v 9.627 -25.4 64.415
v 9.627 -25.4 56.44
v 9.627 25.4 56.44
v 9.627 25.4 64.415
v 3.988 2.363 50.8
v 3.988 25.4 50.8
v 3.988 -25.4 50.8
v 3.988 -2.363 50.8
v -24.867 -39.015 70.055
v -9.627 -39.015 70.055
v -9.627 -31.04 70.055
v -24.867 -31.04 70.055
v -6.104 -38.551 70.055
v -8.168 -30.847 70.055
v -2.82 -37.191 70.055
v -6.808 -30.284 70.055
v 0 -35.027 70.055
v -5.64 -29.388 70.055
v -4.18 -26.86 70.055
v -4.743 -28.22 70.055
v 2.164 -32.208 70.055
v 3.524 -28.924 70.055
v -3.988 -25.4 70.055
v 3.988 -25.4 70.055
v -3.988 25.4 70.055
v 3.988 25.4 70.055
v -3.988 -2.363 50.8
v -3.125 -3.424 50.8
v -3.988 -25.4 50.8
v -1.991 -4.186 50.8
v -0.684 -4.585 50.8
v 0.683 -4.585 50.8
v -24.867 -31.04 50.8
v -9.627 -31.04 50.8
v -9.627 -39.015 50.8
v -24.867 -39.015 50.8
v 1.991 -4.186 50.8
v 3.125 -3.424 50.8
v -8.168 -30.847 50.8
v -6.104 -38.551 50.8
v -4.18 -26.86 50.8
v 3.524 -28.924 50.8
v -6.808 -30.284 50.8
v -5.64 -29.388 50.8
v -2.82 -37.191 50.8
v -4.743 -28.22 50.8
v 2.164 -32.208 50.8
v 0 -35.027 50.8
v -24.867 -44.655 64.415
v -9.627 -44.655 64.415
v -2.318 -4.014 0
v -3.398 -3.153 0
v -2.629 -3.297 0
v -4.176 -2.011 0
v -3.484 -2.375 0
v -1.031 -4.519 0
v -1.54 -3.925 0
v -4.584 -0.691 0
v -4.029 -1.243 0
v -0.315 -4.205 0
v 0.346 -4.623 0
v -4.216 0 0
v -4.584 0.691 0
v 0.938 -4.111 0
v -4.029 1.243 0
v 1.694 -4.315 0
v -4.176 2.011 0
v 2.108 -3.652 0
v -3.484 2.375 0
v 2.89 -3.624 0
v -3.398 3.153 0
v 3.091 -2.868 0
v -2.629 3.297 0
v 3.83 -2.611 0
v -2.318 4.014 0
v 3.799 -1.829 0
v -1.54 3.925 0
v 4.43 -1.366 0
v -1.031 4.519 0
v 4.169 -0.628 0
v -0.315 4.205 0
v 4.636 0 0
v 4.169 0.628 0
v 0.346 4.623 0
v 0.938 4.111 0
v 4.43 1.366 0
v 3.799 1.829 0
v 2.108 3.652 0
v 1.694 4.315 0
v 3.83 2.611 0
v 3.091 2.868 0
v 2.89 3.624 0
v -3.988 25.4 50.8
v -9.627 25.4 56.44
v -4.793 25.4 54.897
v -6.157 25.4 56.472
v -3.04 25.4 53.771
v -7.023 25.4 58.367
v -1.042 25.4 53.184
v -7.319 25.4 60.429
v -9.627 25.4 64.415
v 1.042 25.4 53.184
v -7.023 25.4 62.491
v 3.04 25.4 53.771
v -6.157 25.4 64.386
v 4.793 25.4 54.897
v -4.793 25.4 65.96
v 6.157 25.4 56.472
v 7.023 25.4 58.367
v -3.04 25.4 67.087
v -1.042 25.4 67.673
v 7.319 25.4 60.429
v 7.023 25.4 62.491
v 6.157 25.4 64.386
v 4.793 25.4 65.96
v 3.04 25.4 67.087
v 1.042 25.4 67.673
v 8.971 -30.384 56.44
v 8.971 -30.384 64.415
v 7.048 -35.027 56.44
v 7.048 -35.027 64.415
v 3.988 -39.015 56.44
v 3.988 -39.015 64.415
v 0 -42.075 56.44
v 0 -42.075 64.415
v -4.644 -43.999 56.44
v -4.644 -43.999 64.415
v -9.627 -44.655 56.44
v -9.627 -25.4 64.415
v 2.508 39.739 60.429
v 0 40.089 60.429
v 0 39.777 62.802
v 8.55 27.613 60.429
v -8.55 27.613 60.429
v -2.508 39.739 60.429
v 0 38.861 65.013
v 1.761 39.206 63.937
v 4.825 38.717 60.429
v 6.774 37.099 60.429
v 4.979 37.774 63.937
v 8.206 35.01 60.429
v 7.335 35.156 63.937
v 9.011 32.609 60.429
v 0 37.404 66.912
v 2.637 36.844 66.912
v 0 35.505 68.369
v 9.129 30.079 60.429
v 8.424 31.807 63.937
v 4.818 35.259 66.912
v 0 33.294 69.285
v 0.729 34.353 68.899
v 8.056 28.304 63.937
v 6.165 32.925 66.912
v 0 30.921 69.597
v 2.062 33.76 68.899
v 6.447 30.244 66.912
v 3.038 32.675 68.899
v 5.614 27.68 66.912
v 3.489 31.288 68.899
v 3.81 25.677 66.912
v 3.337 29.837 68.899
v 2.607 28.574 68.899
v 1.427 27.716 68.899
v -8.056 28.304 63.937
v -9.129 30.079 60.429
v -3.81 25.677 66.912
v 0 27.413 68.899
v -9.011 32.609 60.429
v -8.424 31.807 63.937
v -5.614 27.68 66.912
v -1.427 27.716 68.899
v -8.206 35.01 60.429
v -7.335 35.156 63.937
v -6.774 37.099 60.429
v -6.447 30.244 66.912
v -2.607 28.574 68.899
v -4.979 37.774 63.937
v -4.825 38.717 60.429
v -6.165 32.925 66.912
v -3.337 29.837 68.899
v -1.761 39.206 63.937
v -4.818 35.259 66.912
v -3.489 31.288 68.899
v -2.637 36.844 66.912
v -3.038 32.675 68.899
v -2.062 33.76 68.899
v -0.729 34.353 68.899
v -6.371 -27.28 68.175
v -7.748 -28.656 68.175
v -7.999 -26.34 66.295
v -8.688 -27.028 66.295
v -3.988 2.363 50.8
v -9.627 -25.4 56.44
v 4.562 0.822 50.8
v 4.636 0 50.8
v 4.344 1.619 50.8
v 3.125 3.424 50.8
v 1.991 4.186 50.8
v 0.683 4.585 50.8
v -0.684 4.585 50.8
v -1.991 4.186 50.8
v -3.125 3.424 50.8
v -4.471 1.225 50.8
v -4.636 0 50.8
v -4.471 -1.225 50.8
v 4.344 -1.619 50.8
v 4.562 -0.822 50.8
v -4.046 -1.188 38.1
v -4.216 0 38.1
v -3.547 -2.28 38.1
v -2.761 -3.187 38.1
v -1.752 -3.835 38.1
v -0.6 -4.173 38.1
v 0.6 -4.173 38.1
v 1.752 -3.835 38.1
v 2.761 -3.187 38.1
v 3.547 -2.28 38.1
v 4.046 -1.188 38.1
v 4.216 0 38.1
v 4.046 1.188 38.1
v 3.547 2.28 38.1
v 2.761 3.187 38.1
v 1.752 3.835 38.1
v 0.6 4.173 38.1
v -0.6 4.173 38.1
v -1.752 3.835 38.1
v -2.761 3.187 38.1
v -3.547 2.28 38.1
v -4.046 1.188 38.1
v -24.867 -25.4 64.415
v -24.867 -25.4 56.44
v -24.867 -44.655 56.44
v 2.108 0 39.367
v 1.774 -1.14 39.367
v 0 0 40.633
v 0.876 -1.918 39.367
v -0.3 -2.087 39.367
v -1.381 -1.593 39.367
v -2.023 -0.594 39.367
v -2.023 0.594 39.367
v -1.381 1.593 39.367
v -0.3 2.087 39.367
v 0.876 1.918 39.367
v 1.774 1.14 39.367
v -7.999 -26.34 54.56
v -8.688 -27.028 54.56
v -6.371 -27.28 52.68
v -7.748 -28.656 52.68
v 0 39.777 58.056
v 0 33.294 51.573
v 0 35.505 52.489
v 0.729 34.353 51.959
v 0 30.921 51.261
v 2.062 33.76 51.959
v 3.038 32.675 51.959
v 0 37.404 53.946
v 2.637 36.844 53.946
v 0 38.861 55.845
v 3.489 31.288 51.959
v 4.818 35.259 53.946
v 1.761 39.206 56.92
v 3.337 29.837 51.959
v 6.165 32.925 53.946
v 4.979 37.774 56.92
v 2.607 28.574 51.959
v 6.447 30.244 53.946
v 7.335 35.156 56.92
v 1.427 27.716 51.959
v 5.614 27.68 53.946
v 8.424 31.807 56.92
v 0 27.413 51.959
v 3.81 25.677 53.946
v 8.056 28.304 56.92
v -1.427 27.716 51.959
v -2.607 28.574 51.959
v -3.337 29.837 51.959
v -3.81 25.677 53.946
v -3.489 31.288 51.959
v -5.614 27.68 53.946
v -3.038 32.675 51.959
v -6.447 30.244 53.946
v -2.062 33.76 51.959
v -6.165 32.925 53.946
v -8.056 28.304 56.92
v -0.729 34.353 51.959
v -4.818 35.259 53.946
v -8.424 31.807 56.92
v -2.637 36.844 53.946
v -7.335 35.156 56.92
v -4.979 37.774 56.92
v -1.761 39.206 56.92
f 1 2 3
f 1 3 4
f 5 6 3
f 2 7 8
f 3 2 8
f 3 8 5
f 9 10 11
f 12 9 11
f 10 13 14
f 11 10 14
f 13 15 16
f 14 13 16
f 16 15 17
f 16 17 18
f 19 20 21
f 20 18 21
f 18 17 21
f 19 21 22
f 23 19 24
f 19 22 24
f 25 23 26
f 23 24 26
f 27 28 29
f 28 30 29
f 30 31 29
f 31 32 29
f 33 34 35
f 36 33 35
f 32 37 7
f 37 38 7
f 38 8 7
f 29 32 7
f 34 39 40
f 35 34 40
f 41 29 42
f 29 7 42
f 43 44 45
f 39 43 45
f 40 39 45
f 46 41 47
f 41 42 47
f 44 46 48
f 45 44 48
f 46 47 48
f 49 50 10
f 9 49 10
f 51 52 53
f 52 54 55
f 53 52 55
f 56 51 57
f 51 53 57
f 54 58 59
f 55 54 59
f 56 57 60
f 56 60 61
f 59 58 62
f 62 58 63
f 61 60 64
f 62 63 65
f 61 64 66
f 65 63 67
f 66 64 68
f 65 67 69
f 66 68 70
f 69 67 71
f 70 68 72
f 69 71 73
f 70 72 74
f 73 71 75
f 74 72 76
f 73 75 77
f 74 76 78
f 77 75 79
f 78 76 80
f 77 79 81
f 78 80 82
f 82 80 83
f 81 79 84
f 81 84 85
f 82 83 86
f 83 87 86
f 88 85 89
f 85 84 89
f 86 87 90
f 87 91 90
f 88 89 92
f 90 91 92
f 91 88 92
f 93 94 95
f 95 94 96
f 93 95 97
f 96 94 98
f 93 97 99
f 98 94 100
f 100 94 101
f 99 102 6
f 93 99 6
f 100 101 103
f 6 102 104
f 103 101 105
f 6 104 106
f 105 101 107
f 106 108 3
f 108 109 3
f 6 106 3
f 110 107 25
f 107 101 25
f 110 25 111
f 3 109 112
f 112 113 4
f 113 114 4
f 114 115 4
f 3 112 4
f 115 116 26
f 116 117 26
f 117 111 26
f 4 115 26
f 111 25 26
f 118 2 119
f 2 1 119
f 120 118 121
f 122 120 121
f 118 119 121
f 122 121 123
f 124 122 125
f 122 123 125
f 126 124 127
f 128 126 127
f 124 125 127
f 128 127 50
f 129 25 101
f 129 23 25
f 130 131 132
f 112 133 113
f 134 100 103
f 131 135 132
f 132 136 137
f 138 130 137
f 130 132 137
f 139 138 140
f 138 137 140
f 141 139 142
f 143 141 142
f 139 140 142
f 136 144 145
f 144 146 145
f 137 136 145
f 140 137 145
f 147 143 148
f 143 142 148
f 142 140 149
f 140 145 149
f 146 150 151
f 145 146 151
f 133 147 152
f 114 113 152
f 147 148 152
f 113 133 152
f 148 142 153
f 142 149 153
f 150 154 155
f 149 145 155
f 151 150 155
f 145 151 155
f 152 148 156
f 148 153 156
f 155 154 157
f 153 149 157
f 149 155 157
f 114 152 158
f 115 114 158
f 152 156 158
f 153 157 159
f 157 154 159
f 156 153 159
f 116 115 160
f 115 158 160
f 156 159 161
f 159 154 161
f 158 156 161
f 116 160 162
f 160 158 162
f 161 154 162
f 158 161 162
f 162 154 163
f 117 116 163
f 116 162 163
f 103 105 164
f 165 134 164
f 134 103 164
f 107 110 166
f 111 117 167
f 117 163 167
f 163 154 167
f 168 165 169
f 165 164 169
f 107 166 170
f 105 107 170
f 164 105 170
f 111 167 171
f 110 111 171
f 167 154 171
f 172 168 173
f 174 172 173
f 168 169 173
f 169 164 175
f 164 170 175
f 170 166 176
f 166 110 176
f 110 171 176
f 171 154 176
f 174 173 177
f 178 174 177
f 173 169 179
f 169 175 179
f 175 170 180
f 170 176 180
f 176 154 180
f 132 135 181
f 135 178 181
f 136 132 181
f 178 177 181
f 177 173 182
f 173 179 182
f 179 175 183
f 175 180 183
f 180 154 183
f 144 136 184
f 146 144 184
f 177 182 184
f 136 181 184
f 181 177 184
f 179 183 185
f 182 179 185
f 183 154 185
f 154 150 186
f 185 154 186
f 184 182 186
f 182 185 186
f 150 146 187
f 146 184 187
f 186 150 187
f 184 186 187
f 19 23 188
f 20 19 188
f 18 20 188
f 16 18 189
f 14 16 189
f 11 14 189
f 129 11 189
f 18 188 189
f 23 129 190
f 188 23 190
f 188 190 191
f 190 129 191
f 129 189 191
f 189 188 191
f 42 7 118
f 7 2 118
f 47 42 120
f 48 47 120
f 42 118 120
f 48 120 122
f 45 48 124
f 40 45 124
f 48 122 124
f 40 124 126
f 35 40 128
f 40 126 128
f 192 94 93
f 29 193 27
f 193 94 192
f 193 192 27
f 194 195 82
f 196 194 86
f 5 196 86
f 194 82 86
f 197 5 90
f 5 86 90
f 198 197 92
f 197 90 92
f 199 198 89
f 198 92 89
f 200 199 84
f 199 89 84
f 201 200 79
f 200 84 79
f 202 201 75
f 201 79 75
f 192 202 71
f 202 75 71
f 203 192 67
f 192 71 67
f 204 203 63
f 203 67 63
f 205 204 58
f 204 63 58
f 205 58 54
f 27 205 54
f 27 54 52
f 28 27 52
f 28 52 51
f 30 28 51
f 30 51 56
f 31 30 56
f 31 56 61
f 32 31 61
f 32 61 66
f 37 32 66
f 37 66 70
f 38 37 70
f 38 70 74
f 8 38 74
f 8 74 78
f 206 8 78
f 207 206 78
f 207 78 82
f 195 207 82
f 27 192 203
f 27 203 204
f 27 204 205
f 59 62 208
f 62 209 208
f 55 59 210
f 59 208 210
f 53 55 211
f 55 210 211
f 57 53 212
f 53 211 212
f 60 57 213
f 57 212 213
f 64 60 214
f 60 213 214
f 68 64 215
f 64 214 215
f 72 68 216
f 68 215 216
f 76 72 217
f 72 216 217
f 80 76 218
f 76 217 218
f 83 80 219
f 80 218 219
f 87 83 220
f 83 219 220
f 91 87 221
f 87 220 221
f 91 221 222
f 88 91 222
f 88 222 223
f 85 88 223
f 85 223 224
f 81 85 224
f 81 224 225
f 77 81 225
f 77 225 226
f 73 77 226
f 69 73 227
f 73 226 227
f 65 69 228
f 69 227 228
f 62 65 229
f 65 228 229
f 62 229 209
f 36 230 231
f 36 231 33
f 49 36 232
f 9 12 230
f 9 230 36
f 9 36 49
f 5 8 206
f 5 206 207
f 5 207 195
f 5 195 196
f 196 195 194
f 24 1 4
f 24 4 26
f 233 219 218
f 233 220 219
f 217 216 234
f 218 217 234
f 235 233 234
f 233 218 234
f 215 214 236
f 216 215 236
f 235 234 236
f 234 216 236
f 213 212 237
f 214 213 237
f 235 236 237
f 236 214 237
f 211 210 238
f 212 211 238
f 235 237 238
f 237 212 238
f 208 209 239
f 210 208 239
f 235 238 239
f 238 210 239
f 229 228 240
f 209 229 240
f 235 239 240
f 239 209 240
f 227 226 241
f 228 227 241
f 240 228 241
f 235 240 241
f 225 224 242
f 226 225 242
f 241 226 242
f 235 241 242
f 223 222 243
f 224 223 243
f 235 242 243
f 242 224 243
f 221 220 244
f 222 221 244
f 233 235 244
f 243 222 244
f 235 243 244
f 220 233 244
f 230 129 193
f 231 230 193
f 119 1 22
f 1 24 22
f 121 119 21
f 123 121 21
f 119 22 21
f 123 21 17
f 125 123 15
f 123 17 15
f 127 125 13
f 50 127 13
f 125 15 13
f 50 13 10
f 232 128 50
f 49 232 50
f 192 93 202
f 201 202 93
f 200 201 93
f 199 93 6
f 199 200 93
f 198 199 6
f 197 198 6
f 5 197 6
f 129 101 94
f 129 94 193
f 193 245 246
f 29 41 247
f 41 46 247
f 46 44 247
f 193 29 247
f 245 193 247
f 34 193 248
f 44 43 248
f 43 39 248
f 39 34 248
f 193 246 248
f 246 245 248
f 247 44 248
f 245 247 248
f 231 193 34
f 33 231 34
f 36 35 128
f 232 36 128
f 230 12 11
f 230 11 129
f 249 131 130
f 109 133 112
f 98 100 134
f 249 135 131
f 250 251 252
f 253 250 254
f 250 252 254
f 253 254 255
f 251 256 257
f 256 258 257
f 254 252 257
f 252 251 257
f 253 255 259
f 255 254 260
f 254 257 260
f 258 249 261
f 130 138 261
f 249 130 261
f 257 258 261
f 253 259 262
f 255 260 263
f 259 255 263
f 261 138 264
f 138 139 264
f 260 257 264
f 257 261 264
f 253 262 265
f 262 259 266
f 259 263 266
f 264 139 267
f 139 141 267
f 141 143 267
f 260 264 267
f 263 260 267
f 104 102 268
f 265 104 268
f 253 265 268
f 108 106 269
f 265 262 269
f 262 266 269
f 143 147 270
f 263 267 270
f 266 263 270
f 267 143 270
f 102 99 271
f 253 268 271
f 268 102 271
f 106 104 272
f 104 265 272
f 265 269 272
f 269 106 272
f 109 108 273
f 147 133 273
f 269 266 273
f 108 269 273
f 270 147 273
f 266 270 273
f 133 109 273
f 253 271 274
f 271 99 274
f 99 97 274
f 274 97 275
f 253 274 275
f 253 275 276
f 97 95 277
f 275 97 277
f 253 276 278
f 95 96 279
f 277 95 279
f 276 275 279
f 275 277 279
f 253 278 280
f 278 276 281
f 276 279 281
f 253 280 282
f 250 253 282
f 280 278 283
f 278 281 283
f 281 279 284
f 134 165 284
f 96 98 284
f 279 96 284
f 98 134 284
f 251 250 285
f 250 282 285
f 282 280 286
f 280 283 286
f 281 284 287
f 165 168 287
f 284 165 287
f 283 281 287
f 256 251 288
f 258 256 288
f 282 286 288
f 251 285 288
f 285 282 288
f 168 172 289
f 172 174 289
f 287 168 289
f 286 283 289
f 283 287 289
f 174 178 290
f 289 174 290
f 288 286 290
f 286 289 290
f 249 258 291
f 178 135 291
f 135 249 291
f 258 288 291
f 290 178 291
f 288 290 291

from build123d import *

# Parameters (mm, degrees)
F0_R          = 4.6355
F1_DEPTH      = 50.8
F2_D          = 8.4328
F2_DEPTH      = 38.1
F2_TIP        = 2.5334687141
F4_DEPTH      = 25.4
F4_DEPTH_BACK = 25.4
F5_ANGLE      = 90
F10_DEPTH     = 15.24


with BuildPart() as f1:
    # F0 (on Top) → F1 (new body)
    with BuildSketch(Plane.XY):
        Circle(F0_R)
    extrude(amount=F1_DEPTH)

    # F2
    with Locations(Plane(origin=(0, 0, 0), x_dir=(1, 0, 0), z_dir=(0, 0, -1))):
        with Locations((0, 0)):
            Hole(F2_D / 2, depth=F2_DEPTH)
            with Locations((0, 0, -(F2_DEPTH + F2_TIP / 2))):  # 118° drill point
                Cone(0, F2_D / 2, F2_TIP, mode=Mode.SUBTRACT)

    # F3 (on Front) → F4 (join, two sides)
    with BuildSketch(Plane.XZ) as f4_sk:
        Polygon((-9.627444493, 56.439600844), (-3.987843649, 50.8), (3.987756351, 50.8), (9.627357195, 56.439600844), (9.627357195, 64.415200844), (3.987756351, 70.0548016881), (-4.3649e-05, 70.0548016881), (-3.987843649, 70.0548016881), (-9.627444493, 64.415200844), align=None)
    extrude(amount=F4_DEPTH)
    extrude(f4_sk.sketch, amount=-F4_DEPTH_BACK)

    # F4_face (on face) → F5 (revolve)
    with BuildSketch(Plane(origin=(-4.3649e-05, -25.4, 60.427400844), x_dir=(1, 0, 0), z_dir=(0, -1, 0))):
        Polygon((9.627400844, 3.9878), (3.9878, 9.627400844), (-3.9878, 9.627400844), (-9.627400844, 3.9878), (-9.627400844, -3.9878), (-3.9878, -9.627400844), (3.9878, -9.627400844), (9.627400844, -3.9878), align=None)
    revolve(axis=Axis((-9.627444493, -25.4, 60.427400844), (0, 0, -1)), revolution_arc=F5_ANGLE)

    # F7 (on Right) → F8 (revolve)
    with BuildSketch(Plane.YZ):
        with BuildLine():
            ThreePointArc((30.9212189168, 51.2608121409), (37.4040035408, 53.9460694541), (40.089260854, 60.4288540781))
            ThreePointArc((40.089260854, 60.4288540781), (37.4040035408, 66.911638702), (30.9212189168, 69.5968960152))
            Line((30.9212189168, 69.5968960152), (30.9212189168, 60.4288540781))
            Line((30.9212189168, 60.4288540781), (30.9212189168, 51.2608121409))
        make_face()
    revolve(axis=Axis((0, 30.9212189168, 60.4288540781), (0, 0, -1)))

    # F9 (on face) → F10 (join)
    with BuildSketch(Plane(origin=(-9.627444493, 0, 0), x_dir=(0, -1, 0), z_dir=(-1, 0, 0))):
        Polygon((31.039600844, 50.8), (39.015200844, 50.8), (44.6548016881, 56.439600844), (44.6548016881, 64.415200844), (39.015200844, 70.0548016881), (31.039600844, 70.0548016881), (25.4, 64.415200844), (25.4, 56.439600844), align=None)
    extrude(amount=F10_DEPTH)


solid = f1.part
